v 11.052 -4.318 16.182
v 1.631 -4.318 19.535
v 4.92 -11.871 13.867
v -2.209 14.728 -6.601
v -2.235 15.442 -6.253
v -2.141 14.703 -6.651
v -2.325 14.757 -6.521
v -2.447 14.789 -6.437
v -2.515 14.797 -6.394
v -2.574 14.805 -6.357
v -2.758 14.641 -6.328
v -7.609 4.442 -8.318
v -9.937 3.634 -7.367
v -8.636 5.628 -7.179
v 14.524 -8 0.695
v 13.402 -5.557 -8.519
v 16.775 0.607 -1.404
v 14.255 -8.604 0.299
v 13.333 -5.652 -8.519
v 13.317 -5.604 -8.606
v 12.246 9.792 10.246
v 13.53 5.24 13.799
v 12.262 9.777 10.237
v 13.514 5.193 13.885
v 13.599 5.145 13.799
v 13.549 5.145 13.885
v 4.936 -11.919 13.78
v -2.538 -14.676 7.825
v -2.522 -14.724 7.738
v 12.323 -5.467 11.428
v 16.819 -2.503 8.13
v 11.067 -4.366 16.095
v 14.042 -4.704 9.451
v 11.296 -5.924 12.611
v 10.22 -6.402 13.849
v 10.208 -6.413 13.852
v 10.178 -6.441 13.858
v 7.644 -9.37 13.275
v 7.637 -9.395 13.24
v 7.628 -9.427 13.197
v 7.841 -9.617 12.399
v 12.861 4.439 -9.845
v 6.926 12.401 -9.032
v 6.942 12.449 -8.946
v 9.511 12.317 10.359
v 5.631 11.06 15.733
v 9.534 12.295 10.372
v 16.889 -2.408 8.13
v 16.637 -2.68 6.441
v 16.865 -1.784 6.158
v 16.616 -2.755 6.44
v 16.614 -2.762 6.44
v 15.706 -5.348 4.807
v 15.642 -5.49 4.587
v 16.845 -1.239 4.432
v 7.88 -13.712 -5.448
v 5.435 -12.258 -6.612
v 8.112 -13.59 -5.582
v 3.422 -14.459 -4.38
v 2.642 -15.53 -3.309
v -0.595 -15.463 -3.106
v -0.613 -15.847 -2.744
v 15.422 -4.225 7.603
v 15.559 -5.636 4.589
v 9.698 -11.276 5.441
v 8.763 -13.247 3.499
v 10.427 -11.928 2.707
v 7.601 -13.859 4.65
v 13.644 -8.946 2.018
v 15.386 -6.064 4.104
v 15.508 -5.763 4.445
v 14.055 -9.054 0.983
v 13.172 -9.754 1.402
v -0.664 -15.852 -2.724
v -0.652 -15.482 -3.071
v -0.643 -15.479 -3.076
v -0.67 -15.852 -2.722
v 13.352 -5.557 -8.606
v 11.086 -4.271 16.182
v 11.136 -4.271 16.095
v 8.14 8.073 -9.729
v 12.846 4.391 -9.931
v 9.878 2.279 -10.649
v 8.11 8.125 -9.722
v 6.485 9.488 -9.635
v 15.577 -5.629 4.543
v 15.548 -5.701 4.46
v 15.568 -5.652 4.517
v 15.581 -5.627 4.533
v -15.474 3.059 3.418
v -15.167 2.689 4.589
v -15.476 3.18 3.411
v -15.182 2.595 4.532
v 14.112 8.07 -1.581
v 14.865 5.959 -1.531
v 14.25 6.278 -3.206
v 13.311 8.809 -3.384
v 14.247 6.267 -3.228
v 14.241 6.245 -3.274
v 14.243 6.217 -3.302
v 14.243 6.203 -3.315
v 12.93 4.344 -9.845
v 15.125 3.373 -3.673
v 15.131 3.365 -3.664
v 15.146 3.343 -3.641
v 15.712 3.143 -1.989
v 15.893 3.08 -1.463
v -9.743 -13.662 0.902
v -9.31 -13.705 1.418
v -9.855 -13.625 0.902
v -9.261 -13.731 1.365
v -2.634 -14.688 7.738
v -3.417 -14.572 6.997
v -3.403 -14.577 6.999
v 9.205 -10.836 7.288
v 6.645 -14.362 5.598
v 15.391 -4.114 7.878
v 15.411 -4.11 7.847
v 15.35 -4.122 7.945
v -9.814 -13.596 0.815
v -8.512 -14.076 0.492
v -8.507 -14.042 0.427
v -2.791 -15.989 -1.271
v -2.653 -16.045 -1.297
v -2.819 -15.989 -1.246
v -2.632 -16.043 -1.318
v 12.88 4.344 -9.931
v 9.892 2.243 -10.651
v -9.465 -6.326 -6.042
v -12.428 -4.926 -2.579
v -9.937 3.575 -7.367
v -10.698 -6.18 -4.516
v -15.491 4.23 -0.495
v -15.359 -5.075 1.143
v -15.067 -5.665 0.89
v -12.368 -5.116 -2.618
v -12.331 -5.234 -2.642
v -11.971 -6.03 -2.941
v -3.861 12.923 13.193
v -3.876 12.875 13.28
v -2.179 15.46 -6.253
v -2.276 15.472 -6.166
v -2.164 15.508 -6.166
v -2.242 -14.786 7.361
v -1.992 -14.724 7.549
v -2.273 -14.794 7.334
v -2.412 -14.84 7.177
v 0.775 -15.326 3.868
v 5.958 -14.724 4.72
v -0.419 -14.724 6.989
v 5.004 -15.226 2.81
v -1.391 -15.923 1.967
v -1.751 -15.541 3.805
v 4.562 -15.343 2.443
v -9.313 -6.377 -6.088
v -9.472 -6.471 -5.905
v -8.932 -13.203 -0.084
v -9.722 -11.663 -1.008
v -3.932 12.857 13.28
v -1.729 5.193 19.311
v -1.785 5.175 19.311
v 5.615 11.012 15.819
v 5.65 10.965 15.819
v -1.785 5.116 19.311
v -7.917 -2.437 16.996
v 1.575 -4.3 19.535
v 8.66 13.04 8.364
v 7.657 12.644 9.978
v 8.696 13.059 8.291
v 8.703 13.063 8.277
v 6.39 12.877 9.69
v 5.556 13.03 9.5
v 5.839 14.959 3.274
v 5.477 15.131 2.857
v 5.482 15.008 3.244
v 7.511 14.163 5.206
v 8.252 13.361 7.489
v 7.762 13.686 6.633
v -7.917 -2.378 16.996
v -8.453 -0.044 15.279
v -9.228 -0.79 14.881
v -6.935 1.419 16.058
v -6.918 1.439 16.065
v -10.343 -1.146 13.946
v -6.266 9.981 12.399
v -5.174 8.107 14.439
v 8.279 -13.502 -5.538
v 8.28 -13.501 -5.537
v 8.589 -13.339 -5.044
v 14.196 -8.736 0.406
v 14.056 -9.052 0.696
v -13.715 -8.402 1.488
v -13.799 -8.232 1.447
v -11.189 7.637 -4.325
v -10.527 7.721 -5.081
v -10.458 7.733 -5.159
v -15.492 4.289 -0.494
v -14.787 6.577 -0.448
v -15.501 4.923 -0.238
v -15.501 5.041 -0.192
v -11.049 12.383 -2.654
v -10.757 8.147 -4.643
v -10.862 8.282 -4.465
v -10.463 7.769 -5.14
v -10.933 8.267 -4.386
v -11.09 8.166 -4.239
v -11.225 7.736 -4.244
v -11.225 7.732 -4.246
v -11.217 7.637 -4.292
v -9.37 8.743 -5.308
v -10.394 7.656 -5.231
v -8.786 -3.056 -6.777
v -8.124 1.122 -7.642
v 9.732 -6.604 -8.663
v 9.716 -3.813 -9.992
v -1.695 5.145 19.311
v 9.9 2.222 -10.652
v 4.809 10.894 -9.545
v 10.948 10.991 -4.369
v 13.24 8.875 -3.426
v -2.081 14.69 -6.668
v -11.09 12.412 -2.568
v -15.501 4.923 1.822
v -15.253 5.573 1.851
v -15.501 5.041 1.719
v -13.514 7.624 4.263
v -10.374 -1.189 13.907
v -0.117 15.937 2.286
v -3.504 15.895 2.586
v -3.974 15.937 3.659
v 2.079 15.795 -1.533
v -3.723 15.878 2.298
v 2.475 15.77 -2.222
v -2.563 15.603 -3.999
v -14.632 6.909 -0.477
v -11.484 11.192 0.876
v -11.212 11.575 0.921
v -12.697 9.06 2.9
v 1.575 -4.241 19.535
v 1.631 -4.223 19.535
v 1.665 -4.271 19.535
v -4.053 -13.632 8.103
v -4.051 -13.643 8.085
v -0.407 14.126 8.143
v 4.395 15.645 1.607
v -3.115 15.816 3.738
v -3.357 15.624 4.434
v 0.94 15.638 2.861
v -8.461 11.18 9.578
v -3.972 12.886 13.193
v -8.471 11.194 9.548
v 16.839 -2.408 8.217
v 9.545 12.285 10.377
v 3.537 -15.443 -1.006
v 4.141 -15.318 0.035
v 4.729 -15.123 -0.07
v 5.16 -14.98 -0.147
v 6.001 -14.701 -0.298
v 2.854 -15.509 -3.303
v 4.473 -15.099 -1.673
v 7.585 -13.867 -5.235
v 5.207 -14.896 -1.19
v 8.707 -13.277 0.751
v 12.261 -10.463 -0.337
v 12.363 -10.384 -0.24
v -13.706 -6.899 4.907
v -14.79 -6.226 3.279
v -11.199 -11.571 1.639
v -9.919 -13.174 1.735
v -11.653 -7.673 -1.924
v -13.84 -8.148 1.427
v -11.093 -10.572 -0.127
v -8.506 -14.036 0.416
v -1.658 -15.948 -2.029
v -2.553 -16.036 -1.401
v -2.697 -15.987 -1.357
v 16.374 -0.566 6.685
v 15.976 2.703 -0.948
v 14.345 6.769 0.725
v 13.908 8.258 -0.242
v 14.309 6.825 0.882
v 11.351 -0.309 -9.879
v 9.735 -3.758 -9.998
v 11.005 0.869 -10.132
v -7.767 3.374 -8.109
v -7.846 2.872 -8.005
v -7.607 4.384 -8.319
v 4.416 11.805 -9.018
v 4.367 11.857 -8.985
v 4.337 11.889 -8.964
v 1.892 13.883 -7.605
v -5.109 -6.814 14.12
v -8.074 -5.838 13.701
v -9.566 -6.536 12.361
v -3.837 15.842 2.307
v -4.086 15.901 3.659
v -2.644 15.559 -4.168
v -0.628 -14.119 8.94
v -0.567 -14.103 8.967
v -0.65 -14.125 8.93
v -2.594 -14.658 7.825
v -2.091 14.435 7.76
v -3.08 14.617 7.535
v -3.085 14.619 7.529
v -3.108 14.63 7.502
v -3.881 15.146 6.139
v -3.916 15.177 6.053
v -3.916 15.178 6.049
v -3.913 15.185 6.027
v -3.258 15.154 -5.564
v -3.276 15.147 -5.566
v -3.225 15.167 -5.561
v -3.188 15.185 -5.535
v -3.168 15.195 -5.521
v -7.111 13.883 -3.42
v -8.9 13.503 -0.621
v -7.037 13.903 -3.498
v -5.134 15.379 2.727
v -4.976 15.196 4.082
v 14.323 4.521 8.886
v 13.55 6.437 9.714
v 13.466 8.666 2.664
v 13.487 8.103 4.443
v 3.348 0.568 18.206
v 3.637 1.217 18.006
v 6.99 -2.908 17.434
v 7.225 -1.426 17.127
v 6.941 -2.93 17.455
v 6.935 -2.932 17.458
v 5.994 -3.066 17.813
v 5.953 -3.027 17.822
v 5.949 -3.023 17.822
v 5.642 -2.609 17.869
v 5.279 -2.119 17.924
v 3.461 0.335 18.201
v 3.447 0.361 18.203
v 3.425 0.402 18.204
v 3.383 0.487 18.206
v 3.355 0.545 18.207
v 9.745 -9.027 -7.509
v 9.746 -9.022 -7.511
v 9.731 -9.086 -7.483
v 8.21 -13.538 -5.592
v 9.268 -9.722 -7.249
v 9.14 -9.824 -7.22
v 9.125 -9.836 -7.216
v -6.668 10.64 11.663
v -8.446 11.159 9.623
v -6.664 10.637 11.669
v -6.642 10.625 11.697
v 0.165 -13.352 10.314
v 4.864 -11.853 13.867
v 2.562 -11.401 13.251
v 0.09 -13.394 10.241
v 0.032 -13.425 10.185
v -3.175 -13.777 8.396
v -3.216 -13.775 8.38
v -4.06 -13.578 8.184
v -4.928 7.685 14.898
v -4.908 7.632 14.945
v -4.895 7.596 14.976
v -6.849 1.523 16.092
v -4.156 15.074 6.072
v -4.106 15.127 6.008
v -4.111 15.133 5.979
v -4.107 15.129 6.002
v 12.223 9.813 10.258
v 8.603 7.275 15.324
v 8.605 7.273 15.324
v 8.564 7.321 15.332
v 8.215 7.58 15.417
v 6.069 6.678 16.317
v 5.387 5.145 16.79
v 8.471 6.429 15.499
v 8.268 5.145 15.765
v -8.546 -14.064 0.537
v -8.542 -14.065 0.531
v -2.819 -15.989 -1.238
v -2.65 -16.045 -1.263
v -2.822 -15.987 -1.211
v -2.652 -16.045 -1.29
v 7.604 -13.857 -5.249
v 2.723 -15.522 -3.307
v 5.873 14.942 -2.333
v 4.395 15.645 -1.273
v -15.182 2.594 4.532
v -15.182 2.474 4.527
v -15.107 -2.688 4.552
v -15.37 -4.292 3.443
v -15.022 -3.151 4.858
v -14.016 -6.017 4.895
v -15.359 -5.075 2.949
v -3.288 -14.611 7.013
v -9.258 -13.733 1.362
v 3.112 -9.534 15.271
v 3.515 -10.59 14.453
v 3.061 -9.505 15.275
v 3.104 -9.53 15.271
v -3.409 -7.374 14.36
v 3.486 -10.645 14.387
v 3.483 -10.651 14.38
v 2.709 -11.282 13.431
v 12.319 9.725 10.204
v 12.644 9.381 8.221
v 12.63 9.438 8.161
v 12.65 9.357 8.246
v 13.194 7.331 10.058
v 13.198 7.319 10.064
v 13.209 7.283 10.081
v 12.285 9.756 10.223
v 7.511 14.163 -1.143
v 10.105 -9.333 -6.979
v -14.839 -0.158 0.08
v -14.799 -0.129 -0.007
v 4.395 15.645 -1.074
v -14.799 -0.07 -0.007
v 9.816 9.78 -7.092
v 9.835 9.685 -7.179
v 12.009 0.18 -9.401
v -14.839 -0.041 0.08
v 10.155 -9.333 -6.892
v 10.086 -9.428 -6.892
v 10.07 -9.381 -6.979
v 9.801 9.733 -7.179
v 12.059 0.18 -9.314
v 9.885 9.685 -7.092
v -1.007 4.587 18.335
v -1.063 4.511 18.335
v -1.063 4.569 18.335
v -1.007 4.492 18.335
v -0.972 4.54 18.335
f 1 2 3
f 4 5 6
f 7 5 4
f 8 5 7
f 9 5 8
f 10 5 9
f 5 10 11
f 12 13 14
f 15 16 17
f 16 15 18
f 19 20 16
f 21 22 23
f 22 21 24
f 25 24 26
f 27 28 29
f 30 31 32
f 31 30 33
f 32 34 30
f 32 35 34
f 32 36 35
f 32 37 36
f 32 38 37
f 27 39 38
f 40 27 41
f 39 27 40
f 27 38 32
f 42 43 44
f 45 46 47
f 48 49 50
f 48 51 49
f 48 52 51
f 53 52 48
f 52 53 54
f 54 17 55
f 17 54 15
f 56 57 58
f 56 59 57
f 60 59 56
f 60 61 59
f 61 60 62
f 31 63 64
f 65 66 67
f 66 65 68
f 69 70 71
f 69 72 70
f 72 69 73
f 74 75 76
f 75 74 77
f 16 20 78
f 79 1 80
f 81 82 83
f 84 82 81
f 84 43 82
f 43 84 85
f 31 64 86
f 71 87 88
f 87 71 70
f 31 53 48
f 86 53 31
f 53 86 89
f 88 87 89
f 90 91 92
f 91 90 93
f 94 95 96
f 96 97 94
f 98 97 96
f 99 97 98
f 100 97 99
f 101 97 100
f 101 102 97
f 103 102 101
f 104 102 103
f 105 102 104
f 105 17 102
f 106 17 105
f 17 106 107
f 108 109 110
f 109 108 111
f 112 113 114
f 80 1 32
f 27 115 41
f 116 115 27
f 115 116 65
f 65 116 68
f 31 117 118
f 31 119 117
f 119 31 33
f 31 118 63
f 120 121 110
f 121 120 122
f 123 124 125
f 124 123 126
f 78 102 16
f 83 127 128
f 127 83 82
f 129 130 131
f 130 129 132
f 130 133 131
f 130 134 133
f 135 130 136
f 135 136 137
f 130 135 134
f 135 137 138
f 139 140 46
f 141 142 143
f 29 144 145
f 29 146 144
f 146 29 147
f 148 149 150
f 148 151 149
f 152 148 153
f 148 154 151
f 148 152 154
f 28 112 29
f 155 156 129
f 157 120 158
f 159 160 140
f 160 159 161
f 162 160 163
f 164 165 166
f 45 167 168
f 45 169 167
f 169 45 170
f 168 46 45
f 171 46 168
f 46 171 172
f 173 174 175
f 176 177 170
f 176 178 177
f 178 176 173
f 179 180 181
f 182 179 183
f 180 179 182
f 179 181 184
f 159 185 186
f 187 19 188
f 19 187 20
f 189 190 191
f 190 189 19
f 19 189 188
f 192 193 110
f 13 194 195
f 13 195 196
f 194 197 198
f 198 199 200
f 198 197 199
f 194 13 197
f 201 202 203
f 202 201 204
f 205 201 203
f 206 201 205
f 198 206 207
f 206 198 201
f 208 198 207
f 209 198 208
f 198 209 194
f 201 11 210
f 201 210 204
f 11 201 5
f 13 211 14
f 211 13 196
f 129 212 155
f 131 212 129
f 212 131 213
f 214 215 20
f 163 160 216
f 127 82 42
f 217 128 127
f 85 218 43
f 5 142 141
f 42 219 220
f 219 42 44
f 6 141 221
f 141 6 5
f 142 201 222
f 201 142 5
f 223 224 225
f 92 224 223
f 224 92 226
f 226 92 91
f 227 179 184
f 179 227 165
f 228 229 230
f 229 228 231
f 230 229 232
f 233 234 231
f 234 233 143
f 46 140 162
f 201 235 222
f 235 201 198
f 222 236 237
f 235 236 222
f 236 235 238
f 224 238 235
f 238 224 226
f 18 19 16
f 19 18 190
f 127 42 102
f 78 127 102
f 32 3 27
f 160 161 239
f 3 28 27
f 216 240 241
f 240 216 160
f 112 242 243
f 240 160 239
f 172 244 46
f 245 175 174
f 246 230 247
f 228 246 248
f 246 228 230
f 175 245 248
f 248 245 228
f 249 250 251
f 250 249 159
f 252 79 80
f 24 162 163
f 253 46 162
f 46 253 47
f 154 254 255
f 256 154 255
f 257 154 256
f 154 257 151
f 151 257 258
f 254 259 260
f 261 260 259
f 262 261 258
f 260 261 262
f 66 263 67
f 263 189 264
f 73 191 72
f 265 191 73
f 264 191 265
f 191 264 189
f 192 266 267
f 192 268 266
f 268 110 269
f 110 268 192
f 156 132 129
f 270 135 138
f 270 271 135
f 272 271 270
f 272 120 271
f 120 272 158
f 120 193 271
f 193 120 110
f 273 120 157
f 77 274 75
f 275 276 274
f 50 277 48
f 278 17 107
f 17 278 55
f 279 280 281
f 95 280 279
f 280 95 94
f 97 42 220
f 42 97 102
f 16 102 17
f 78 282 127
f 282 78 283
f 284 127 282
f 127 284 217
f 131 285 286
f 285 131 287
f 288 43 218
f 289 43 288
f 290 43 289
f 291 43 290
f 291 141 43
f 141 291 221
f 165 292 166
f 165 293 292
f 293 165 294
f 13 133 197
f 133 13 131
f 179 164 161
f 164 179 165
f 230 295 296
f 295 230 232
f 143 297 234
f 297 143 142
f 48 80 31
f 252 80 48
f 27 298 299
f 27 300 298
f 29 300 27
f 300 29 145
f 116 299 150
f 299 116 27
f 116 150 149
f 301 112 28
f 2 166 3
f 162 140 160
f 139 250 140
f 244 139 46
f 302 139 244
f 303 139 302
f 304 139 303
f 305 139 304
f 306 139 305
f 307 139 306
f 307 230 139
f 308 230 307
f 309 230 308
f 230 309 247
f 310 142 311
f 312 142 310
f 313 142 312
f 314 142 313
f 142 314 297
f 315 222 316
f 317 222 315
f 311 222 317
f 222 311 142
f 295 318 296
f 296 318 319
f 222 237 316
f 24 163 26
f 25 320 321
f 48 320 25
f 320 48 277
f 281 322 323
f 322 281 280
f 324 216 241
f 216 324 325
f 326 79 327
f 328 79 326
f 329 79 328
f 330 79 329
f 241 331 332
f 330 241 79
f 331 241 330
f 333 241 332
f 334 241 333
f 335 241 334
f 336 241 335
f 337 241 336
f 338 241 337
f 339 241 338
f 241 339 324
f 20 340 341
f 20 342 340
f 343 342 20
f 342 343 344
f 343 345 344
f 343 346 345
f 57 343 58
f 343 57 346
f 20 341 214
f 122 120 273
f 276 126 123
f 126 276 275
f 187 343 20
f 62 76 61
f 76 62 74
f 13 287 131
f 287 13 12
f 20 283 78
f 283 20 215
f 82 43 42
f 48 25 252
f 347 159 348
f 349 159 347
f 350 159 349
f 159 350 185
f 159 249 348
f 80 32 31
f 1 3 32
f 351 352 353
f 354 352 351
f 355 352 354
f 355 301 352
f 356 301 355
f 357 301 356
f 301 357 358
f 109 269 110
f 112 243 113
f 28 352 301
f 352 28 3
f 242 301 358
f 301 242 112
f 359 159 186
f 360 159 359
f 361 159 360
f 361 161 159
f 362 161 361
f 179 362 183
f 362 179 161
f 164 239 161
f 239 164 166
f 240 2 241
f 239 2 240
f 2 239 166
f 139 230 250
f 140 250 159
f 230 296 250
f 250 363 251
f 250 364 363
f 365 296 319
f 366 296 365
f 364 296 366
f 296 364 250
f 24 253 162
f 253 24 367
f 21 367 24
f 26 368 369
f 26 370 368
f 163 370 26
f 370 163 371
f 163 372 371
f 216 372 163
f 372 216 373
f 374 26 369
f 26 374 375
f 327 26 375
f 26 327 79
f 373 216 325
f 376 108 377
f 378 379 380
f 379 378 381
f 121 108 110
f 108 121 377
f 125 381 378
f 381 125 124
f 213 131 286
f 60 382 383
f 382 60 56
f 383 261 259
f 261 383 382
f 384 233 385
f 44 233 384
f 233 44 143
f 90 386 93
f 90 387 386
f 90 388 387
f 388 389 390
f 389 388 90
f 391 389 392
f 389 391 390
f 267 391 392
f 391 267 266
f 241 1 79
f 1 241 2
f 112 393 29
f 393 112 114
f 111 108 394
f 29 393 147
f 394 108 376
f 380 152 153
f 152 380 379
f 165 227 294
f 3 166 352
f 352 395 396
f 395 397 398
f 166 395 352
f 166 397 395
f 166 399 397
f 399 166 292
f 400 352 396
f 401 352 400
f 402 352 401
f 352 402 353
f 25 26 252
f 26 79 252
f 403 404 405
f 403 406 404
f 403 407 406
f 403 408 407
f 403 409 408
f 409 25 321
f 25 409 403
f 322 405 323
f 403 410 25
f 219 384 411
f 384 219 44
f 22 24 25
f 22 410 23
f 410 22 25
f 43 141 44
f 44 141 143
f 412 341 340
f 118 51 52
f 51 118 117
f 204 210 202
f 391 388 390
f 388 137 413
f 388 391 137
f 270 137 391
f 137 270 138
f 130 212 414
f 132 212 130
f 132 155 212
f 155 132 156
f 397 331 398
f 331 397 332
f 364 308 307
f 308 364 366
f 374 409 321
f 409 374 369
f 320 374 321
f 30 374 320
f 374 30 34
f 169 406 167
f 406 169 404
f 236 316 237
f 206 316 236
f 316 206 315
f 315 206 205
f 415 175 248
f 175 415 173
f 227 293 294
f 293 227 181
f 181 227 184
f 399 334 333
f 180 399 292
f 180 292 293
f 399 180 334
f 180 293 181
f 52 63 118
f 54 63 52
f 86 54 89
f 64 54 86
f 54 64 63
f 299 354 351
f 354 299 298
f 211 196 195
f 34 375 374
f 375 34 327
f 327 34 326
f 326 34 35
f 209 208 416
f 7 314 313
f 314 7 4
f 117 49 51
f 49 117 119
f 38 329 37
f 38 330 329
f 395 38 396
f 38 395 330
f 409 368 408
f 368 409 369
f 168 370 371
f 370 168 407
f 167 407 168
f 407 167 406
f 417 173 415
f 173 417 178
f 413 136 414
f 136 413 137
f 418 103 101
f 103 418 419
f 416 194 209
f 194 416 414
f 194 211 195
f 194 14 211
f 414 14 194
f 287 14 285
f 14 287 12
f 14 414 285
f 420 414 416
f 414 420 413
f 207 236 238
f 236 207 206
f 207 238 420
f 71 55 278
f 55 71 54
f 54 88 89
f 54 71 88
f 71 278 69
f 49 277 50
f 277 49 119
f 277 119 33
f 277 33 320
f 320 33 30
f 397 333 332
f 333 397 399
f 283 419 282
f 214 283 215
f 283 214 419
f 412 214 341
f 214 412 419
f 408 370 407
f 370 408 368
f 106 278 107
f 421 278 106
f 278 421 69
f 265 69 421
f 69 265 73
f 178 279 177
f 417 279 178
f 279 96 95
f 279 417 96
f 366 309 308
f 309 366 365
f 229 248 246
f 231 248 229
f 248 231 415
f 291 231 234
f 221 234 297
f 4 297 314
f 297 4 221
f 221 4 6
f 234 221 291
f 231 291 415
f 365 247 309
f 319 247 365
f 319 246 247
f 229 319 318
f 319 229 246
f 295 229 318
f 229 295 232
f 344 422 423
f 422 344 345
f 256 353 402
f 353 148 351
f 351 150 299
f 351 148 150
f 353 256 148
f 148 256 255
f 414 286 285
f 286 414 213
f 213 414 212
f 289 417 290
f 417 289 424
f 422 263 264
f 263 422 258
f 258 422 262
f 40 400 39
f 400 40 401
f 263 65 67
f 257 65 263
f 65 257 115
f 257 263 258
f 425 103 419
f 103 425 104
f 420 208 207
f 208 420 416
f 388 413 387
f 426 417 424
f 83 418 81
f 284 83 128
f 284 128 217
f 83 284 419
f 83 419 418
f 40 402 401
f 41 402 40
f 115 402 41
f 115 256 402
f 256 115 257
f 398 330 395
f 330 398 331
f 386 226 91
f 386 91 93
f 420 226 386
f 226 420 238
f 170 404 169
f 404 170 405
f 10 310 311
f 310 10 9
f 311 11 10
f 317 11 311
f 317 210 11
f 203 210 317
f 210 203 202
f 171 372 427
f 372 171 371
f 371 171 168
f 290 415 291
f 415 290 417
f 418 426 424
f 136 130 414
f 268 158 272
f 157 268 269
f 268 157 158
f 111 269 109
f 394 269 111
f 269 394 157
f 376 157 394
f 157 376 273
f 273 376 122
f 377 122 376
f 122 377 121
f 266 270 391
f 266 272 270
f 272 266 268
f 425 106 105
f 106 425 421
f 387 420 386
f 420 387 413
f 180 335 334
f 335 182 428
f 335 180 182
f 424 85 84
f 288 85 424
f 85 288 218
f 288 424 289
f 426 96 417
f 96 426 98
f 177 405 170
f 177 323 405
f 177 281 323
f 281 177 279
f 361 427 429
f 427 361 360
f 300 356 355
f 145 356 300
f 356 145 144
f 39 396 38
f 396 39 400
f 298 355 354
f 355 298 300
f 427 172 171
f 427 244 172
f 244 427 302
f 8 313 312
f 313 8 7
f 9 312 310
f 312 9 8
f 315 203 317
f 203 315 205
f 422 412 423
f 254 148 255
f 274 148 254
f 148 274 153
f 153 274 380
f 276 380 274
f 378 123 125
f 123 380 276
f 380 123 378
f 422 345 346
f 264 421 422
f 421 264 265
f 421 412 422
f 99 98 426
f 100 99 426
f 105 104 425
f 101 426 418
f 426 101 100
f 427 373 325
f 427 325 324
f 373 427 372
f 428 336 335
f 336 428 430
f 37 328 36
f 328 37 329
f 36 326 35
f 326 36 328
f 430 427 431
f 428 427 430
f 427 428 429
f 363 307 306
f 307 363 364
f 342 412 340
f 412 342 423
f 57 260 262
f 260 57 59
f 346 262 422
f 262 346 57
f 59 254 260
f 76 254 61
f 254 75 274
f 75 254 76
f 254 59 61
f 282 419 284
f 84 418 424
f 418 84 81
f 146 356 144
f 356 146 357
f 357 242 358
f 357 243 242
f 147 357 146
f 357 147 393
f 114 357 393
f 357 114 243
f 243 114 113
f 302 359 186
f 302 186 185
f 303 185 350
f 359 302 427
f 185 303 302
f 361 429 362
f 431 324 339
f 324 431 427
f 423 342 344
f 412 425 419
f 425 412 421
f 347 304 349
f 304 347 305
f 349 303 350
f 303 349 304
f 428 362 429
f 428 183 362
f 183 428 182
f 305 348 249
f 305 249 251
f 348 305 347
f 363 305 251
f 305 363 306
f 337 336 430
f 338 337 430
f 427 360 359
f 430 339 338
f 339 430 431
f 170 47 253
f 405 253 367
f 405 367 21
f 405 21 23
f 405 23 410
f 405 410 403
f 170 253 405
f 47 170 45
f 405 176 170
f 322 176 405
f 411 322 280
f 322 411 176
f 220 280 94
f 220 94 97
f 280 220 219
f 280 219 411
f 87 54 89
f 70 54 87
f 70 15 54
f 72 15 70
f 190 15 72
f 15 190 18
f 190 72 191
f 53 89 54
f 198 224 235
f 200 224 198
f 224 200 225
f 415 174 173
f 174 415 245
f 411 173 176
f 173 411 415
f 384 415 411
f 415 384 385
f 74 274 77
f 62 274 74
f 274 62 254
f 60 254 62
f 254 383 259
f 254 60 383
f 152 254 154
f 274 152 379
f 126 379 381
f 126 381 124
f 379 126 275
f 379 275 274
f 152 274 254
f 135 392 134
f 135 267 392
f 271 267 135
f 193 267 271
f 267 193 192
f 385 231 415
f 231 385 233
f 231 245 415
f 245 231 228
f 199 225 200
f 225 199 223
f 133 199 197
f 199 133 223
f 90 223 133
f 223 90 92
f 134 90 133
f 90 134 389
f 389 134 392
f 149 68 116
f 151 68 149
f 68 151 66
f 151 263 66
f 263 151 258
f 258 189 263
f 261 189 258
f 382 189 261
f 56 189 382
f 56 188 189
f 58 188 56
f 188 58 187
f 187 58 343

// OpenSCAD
// Auto-generated OpenSCAD file

    inner_points = 10*[[0.9785360441964507, 0.9685060087804973, -0.7092049571073851], [-0.7218333121630555, -0.9371211507350073, 1.2781211700972077], [-1.1656165136305032, 1.3079692585994611, 0.41648198007898896], [0.12642830900148935, -1.3068898411312557, -0.9853981930688116], [-0.22333094402334933, 1.5535674106354085, 0.6440329700277245], [1.005476703886223, -0.9333113753571688, -0.6892343037094695], [-0.7487739718528278, 0.9646962334026586, 1.2581505166992923], [0.4800336760567444, -1.5221825525899184, -0.07511675703790183], [0.08934767207892022, 1.3107372224336087, -1.012885439345699], [0.48861147976637076, 0.5027013227208416, -1.446090236925663], [-1.5277996843953847, -0.5016219052526364, 0.8771740239358404], [-1.128535876707934, -1.309657804965403, 0.4439692263558762], [0.43644277299934864, 1.5550226153402404, -0.10742995301327285], [1.1958876650432781, 0.018046999695751874, -0.9314344442707686], [-0.939184933009883, 0.013337858349738127, 1.5003506572605914], [-0.17974004096595367, -1.5236377572947502, 0.6763461660030955], [-0.5425111962571489, 1.6183222038887703, -0.3014461589511666], [0.5027750227462976, -0.4971432456893552, -1.4355910431050312], [-1.5419632273753114, 0.4982226631575605, 0.8666748301152085], [-0.4966770083718649, -1.617242786420565, -0.2674700540386561], [1.4826091915535184, 0.7286877016062595, 0.809489031294333], [0.6324245133737653, -0.22412587815149274, 1.8031520948966295], [1.6999608124003458, -0.22177130747848592, 0.5872595441309494], [1.1745177845708672, -0.8106424847112358, 1.2013770908025172], [0.8228354745308205, 0.7272324969014278, 1.5609519543353303], [1.6251024487516763, 0.45780294600218496, -0.14251785987525334], [0.24947474274244444, -1.083881810988317, 1.4652627503986109], [0.7479771108821508, 1.4068067503820987, 0.8311745503291275], [-0.10220756729760253, 0.45399317062434624, 1.824837613931424], [1.317011041769025, -1.0815272403153102, 0.2493701996329309], [-1.0994824342008114, 0.7998110906252263, -0.4422389058083036], [-0.453460022884815, -0.5076184592401323, -1.1431789923822038], [-1.4758291479456198, -0.00993550481667447, 0.007953944227915899], [-1.0765653402581692, -0.8179714045294413, -0.42525085335204815], [-0.4676235658647422, 0.4922261091700644, -1.1536781862028358]];

    outer_points = 10*[[1.6675078734833215, 0.0606578658798944, -0.14037183476169734], [-1.3812010323162374, 0.0606578658798944, 0.9447594765080658], [-0.21947760683013753, 1.5412866403759968, -0.6166289071353418], [-0.0668292343369466, -1.6626023721357857, -0.1877587346110266], [0.5416162372999497, 1.5841976272977822, 0.030591926605881947], [0.6867934666614489, -1.4628818955379934, 0.4384716988297587], [-0.40048662549436476, 1.5841976272977822, 0.36591594291660967], [-0.2553093961328655, -1.4628818955379934, 0.7737957151404864], [1.2830083443582905, 0.43437021059876024, -0.9844685090279552], [1.3301792856223638, -0.5556859423585491, -0.8519403373374261], [-1.616486126789448, 0.43437021059876024, 0.047552695591057736], [-1.5693151855253746, -0.5556859423585491, 0.1800808672815868], [1.3315198473616163, 1.0022572216480545, -0.16279279637858096], [1.421244309499562, -0.8809414898882658, 0.08929076617934018], [-1.1349374683324778, 1.0022572216480545, 0.7150968755670284], [-1.0452130061945322, -0.8809414898882658, 0.9671804381249495], [0.6910920823419752, 1.2353424637267059, -0.8945875406321075], [0.814587209852644, -1.3566581954864947, -0.5476242826794208], [-1.100894051019728, 1.2353424637267059, -0.25676335906694764], [-0.9773989235090593, -1.3566581954864947, 0.09019989888573907], [1.3498755222367103, 0.5145289147819359, 1.3798731287754311], [-0.1744789306630692, 0.5145289147819359, 1.9224387844103128], [1.1036119582529507, -0.4270704409862244, 1.6095357297164685], [0.16150909545863612, -0.4270704409862244, 1.9448597460271964], [0.5599719121750438, 1.0964693204316633, 1.573257851759894], [1.6788523044425723, -0.24077480503880566, 0.8130481402697834], [-0.7876050112515218, -0.24077480503880566, 1.6909378122153926], [1.1352122583646653, 1.2827649563790822, 0.7767702623132089], [-0.38914219453511406, 1.2827649563790822, 1.3193359179480906], [0.4904858776644981, -1.182374160806966, 1.3780347575215486], [-0.10820638536813701, 0.6663583620181512, -1.0879241680961655], [-0.03188219912154147, -0.93558614423774, -0.8734890818340078], [-0.9896228295577276, 0.3604141853688603, -0.7280586200277711], [-0.9424518882936543, -0.629641967588449, -0.595530448337242], [0.483709876648178, -0.13461389110979438, -1.177805136492013]];

    // Convex hull for inner set (I)
    module inner_hull() {
        hull() {
            for (p = inner_points) {
                translate(p) sphere(r=0.1);
            }
        }
    }

    // Convex hull for outer set (O) minus inner hull (O \ I)
    module outer_minus_inner() {
        difference() {
            hull() {
                for (p = outer_points) {
                    translate(p) sphere(r=0.1);
                }
            }
            inner_hull(); // Subtract inner hull
        }
    }

    // Convex hull for outer set (O) minus all translated inner hulls
    module outer_minus_AllTranslationInner() {
        difference() {
            hull() {
                for (p = outer_points) {
                    translate(p) sphere(r=0.1);
                }
            }
            hull() {
                translate([0,0,50]) inner_hull();
                translate([0,0,-50]) inner_hull();
            }; // Subtract translated inner hulls
        }
    }

    // Difference between outer_minus_inner and outer_minus_AllTranslationInner
    module outer_minus_inner_diff() {
        difference() {
            // Outer minus inner
            difference() {
                hull() {
                    for (p = outer_points) {
                        translate(p) sphere(r=0.1);
                    }
                }
                inner_hull();
            }

            // Subtract Outer minus AllTranslationInner
            difference() {
                hull() {
                    for (p = outer_points) {
                        translate(p) sphere(r=0.1);
                    }
                }
                hull() {
                    translate([0,0,50]) inner_hull();
                    translate([0,0,-50]) inner_hull();
                };
            }
        }
    }

    // Rendering all with colors applied
    color([1, 1, 0, 1]) outer_minus_inner_diff(); // Opaque yellow
    
